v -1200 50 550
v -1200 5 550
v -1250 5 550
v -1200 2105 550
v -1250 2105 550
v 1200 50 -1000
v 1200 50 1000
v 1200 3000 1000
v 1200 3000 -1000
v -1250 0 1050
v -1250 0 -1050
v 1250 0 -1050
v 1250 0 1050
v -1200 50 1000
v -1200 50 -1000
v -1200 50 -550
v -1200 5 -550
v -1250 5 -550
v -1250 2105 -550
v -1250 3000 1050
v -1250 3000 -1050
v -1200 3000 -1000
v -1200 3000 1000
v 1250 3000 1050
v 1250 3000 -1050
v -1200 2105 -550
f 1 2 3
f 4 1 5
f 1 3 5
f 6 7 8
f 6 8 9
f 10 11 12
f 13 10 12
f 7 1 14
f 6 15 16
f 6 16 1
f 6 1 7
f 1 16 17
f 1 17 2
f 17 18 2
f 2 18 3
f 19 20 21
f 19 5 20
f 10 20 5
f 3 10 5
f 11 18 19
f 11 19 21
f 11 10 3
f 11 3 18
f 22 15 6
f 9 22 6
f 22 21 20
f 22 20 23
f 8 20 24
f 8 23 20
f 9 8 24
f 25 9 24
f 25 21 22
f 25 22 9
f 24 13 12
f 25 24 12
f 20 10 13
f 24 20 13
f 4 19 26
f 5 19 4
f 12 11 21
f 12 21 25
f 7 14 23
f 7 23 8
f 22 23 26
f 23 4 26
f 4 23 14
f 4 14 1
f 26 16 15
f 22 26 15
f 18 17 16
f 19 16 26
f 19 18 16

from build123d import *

# Parameters (mm, degrees)
SKETCH1_W           = 2500
SKETCH1_H           = 2100
BOSS_EXTRUDE1_DEPTH = 3000
SHELL1_T            = -50
SKETCH2_W           = 1100
SKETCH2_H           = 2100
CUT_EXTRUDE1_DEPTH  = 50


with BuildPart() as part:
    # Sketch1 → Boss-Extrude1 (new body)
    with BuildSketch(Plane(origin=(0, 0, 0), x_dir=(1, 0, 0), z_dir=(0, 1, 0))):
        Rectangle(SKETCH1_W, SKETCH1_H)
    extrude(amount=BOSS_EXTRUDE1_DEPTH)

    # Shell1
    shell1_openings = [part.faces().sort_by_distance(p)[0] for p in [
        (0, 3000, 0),
    ]]
    offset(amount=SHELL1_T, openings=shell1_openings, kind=Kind.INTERSECTION)

    # Sketch2 → Cut-Extrude1 (cut)
    with BuildSketch(Plane.ZY.offset(1250)):
        with Locations((0, 1055)):
            Rectangle(SKETCH2_W, SKETCH2_H)
    extrude(amount=-CUT_EXTRUDE1_DEPTH, mode=Mode.SUBTRACT)


solid = part.part
